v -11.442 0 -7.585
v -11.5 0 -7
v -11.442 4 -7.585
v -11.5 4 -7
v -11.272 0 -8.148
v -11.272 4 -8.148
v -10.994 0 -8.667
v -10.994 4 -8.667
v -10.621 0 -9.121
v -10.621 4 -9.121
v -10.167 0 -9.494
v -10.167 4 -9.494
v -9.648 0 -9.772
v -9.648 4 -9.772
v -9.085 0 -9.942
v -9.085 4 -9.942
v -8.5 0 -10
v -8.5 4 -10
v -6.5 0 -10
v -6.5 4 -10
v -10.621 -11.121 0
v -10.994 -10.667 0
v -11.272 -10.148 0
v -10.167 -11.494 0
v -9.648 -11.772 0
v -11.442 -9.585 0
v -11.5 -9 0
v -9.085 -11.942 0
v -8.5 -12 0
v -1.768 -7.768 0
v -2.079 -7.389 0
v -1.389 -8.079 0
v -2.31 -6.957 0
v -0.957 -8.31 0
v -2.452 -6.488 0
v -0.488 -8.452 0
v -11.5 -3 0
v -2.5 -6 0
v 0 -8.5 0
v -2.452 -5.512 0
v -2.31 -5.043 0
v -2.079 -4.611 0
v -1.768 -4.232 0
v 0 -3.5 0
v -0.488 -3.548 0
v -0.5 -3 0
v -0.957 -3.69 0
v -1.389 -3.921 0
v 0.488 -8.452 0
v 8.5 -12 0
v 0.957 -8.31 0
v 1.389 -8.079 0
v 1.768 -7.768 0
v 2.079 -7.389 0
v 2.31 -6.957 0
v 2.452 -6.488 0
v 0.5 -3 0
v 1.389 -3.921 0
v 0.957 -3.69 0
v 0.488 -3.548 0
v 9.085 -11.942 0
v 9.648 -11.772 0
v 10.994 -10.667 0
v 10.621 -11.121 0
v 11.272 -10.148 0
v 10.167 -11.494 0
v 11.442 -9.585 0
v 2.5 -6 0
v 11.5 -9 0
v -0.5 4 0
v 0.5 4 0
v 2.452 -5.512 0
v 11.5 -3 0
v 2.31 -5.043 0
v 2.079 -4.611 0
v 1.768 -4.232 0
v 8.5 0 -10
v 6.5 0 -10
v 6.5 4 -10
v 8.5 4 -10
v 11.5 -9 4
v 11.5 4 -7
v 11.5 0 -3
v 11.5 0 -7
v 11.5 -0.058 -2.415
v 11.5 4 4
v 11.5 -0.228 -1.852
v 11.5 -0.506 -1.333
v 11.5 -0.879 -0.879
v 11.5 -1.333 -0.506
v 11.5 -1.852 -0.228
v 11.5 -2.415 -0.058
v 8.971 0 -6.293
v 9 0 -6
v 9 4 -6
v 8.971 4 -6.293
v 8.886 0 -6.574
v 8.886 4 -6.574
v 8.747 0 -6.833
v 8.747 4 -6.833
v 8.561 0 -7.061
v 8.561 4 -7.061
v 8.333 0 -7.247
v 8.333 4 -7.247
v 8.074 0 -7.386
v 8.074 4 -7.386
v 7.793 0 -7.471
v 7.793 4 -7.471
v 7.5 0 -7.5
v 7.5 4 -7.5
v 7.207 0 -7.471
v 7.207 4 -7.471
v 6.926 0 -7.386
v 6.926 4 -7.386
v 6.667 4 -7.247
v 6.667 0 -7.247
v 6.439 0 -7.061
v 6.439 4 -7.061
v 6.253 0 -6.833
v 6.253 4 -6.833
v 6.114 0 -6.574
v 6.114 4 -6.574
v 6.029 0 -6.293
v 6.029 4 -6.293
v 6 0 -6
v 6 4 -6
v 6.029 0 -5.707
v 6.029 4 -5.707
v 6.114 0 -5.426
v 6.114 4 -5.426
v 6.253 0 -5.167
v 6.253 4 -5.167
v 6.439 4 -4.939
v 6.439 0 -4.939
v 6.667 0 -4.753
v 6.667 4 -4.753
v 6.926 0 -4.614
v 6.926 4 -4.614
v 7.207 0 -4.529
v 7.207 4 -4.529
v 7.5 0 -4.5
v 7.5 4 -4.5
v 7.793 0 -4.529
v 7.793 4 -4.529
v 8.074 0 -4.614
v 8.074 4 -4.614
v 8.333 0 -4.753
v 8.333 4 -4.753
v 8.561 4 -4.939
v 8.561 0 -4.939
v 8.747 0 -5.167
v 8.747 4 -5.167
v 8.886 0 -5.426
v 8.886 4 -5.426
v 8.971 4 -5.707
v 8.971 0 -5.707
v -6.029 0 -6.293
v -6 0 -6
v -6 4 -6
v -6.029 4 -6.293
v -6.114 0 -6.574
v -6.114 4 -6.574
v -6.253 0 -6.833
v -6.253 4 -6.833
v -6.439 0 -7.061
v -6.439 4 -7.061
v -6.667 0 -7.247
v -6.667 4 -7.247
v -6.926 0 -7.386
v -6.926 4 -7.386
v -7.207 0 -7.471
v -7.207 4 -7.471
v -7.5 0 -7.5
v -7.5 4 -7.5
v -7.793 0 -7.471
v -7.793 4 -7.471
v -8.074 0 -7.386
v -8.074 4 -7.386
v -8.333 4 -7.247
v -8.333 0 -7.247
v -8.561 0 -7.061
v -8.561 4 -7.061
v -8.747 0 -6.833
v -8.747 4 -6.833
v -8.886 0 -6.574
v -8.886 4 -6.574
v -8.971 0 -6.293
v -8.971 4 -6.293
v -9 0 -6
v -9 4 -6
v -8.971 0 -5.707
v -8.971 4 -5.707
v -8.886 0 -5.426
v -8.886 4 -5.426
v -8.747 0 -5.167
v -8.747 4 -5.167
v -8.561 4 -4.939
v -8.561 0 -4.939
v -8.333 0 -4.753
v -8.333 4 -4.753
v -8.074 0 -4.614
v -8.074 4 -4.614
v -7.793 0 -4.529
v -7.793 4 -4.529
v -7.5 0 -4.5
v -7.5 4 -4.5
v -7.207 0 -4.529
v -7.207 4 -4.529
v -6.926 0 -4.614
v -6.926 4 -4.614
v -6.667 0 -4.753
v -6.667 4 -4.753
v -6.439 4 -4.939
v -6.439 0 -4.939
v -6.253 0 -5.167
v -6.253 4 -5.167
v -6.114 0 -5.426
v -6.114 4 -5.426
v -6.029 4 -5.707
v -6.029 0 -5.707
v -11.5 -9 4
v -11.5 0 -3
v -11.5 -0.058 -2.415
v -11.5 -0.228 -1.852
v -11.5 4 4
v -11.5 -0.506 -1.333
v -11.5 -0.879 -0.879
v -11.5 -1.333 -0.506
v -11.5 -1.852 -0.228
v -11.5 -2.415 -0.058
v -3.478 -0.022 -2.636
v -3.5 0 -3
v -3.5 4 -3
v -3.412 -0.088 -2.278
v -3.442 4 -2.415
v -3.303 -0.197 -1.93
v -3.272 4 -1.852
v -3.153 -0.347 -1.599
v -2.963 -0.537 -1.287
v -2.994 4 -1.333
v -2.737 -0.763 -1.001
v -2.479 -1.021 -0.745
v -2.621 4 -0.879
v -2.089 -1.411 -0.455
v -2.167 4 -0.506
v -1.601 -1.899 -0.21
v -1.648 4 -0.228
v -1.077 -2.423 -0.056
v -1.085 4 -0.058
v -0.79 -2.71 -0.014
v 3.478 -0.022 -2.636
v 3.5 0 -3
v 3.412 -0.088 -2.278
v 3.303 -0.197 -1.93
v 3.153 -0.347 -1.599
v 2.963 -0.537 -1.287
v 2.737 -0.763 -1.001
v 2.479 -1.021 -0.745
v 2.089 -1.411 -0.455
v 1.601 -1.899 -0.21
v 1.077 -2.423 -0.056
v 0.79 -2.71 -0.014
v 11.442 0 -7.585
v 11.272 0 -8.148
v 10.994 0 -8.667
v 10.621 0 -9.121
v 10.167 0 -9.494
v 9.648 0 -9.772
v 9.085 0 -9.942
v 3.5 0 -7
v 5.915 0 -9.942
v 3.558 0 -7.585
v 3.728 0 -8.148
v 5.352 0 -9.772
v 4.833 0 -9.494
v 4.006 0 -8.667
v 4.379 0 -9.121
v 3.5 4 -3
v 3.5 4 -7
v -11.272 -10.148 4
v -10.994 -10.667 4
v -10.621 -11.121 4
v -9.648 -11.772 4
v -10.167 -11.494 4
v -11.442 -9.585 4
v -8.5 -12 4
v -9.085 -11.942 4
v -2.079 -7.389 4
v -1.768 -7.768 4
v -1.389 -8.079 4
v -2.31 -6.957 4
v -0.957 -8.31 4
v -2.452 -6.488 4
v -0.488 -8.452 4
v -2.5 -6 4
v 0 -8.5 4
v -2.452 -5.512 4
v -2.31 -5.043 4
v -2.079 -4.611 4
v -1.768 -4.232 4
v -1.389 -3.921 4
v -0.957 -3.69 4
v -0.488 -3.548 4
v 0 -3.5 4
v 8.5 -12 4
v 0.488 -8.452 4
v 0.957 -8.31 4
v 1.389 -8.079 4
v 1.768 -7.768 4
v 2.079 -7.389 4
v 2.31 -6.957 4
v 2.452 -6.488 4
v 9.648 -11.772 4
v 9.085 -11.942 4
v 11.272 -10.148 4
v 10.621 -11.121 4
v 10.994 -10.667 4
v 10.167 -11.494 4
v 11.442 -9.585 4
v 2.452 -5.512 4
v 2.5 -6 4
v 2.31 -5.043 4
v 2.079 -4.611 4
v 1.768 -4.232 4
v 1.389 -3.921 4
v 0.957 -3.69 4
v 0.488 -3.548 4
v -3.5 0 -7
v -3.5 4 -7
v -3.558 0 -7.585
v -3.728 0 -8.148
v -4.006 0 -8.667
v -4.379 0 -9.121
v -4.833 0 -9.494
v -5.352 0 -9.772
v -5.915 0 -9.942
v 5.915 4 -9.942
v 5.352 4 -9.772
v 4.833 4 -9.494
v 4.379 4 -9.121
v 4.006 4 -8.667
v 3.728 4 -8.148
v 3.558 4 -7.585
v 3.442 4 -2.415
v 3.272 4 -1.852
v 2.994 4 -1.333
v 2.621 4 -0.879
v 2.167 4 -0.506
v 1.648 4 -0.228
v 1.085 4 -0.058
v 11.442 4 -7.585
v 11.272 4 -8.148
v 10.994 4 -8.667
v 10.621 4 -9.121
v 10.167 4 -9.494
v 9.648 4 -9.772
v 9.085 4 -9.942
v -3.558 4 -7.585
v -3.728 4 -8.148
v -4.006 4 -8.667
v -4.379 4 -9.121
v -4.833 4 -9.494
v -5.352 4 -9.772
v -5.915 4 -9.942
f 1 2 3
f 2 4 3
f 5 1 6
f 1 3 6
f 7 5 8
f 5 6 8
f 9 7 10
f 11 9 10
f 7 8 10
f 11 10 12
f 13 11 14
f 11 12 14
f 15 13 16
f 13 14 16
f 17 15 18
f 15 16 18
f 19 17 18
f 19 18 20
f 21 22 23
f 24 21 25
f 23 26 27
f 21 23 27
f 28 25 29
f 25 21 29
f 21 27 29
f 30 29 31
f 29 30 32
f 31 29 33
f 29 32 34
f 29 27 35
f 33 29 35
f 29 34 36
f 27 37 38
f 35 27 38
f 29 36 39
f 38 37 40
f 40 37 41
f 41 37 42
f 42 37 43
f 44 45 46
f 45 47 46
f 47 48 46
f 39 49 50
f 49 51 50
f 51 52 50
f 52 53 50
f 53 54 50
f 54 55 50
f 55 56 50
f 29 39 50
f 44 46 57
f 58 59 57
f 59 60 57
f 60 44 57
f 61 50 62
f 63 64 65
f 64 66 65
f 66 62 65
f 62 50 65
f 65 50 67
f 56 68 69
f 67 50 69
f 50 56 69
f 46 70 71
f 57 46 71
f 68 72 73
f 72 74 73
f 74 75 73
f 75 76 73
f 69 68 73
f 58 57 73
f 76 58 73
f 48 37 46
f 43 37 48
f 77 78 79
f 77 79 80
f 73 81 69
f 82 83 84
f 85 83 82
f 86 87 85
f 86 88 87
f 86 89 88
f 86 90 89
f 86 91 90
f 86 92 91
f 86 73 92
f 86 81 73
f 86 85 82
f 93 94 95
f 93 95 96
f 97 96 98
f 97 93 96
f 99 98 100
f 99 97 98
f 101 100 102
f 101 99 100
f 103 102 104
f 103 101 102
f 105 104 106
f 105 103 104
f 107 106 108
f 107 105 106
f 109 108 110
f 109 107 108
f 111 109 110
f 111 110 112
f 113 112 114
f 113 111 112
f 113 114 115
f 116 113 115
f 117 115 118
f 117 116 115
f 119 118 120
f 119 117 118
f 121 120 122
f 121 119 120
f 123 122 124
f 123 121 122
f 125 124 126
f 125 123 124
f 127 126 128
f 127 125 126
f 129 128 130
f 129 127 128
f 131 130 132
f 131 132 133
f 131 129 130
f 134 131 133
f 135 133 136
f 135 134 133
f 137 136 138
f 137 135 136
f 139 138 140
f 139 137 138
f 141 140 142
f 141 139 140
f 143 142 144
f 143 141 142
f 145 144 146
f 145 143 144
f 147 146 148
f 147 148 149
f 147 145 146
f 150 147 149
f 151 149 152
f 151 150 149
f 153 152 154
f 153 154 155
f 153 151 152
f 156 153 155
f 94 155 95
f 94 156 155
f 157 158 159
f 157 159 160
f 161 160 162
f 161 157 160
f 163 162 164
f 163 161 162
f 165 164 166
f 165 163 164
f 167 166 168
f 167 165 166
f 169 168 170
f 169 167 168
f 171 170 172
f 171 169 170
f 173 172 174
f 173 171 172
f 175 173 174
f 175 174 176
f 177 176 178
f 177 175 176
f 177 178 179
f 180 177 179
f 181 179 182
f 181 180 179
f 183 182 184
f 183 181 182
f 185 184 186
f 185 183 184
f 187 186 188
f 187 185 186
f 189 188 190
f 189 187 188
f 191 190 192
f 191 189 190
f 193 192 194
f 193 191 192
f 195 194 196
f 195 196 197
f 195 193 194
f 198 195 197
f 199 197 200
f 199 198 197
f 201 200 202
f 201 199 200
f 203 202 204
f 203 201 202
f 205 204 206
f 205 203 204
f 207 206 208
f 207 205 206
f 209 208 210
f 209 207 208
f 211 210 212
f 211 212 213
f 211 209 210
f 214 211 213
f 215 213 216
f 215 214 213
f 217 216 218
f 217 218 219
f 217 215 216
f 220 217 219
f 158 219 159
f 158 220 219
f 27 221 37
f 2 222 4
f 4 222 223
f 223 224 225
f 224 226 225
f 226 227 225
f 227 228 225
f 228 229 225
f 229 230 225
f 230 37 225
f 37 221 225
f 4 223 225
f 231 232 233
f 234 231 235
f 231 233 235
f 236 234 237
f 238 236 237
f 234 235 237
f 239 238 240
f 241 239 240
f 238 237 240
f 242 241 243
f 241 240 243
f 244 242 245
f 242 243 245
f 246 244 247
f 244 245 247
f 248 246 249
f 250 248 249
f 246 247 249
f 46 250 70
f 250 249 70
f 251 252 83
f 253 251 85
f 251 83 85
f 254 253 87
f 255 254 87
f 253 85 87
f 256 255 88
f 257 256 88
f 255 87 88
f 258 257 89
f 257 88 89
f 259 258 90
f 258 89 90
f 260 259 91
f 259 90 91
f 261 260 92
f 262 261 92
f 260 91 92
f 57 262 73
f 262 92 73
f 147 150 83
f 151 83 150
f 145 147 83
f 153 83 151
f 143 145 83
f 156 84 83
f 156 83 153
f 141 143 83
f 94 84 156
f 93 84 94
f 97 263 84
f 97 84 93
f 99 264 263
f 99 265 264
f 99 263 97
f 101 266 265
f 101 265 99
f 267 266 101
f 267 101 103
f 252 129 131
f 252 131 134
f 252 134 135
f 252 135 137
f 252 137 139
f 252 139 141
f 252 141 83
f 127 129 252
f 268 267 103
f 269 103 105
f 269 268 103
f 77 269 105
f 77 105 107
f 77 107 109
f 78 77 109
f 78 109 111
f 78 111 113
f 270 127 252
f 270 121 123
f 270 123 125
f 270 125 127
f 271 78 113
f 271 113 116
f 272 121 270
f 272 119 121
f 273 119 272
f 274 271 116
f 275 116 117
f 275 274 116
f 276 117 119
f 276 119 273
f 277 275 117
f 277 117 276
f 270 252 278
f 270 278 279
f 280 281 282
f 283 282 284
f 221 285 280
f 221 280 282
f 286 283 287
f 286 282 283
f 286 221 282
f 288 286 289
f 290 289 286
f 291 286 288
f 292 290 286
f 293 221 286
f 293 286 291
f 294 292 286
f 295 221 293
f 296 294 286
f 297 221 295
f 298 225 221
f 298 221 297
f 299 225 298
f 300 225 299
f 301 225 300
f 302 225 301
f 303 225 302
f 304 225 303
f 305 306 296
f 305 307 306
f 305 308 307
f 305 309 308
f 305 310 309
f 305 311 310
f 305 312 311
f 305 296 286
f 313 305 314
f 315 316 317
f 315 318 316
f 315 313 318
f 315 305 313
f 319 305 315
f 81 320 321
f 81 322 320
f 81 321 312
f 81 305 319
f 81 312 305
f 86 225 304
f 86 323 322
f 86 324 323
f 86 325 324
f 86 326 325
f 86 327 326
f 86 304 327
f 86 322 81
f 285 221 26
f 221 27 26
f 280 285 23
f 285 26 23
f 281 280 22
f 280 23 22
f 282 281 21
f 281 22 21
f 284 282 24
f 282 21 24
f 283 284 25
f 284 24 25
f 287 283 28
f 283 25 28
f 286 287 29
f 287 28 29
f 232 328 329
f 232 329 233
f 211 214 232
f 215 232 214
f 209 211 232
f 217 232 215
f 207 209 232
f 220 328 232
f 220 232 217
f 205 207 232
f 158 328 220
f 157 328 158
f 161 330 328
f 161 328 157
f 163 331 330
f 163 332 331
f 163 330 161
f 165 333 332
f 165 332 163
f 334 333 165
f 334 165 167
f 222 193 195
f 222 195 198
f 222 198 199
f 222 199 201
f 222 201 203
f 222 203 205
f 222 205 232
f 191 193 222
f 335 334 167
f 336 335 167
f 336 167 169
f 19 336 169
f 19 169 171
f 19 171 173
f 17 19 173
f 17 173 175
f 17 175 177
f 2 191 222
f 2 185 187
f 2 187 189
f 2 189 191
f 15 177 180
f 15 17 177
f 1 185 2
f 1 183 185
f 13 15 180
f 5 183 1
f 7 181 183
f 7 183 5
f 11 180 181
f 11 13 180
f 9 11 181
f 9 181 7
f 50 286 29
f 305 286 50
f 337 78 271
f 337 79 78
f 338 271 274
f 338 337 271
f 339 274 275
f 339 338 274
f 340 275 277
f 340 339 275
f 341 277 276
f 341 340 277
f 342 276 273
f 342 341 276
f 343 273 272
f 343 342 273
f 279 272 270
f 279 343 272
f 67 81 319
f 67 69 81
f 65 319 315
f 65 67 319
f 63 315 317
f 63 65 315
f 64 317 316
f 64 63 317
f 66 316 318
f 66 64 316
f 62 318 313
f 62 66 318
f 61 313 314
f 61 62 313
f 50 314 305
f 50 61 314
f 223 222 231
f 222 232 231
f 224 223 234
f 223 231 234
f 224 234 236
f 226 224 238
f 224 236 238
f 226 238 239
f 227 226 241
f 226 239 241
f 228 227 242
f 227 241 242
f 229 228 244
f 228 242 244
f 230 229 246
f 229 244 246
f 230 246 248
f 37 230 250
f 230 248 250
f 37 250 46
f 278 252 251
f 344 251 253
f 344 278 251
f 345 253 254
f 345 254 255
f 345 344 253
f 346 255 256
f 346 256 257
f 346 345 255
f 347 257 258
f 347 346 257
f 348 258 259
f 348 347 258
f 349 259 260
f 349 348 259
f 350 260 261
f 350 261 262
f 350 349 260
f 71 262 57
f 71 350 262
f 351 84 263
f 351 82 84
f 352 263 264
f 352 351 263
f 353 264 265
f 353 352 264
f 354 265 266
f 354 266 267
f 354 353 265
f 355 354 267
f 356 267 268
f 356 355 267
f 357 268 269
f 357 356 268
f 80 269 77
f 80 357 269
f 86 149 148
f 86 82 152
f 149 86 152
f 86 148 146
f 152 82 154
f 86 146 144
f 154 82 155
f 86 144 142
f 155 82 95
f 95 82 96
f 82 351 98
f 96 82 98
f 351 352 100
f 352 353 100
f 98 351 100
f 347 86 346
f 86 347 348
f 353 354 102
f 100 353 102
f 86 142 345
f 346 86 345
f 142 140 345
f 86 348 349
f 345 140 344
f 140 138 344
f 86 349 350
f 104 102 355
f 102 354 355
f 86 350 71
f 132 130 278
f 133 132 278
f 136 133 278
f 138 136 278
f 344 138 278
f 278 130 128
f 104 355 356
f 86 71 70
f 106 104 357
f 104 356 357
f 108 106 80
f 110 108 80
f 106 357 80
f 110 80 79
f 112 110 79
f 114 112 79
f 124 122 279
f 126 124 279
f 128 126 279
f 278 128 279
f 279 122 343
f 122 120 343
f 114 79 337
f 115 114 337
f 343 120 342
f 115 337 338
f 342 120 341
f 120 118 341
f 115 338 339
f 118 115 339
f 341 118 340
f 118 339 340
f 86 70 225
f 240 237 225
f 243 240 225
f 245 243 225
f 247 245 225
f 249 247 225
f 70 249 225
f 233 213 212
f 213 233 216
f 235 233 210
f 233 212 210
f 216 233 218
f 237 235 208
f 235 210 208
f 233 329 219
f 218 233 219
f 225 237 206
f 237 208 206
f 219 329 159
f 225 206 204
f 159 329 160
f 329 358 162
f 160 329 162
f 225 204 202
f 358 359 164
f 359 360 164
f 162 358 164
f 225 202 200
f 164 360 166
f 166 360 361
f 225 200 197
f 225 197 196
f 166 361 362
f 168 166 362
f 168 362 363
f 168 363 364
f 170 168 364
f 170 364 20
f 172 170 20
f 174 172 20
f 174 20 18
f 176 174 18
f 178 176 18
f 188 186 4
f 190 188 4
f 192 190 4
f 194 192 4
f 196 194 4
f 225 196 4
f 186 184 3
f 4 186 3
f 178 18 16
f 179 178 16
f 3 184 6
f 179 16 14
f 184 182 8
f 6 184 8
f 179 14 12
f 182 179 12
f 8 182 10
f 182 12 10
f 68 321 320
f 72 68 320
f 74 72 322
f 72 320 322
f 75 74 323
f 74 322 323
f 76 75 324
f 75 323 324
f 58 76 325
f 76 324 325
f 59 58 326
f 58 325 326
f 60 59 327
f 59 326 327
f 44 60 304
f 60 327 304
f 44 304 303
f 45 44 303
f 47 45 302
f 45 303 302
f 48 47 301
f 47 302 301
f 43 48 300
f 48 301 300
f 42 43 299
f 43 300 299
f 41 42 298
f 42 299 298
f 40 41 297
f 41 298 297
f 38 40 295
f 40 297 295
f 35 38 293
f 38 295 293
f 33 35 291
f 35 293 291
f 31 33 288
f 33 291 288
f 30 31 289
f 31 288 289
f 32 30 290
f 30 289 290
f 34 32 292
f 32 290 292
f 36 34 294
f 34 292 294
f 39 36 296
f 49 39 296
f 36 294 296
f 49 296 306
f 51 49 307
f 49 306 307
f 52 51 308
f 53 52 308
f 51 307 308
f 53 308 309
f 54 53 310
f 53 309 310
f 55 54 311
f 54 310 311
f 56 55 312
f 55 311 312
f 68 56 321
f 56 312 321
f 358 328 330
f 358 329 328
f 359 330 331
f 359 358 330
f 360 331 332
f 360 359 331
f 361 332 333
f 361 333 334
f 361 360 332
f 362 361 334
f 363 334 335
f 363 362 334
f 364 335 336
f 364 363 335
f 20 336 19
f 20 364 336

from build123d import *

# Parameters (mm, degrees)
ESBO_O1_R                = 1.5
RESSALTO_EXTRUS_O1_DEPTH = 4
ESBO_O2_W                = 23
ESBO_O2_H                = 12
ESBO_O2_R                = 2.5
RESSALTO_EXTRUS_O2_DEPTH = 4
FILETE1_R                = 3


with BuildPart() as part:
    # Esboço1 → Ressalto-extrusão1 (new body)
    with BuildSketch(Plane(origin=(0, 0, 0), x_dir=(1, 0, 0), z_dir=(0, 1, 0))):
        Polygon((-3.5, 0), (3.5, 0), (3.5, 10), (11.5, 10), (11.5, -4), (-11.5, -4), (-11.5, 10), (-3.5, 10), align=None)
        with Locations((-7.5, 6)):
            Circle(ESBO_O1_R, mode=Mode.SUBTRACT)
        with Locations((7.5, 6)):
            Circle(ESBO_O1_R, mode=Mode.SUBTRACT)
    extrude(amount=RESSALTO_EXTRUS_O1_DEPTH)

    # Esboço2 → Ressalto-extrusão2 (add)
    with BuildSketch(Plane.XY.offset(4)):
        with Locations((0, -6)):
            Rectangle(ESBO_O2_W, ESBO_O2_H)
        with Locations((0, -6)):
            Circle(ESBO_O2_R, mode=Mode.SUBTRACT)
    extrude(amount=-RESSALTO_EXTRUS_O2_DEPTH)

    # Filete1
    filete1_edges = [part.edges().sort_by_distance(p)[0] for p in [
        (-3.5, 2, 0),
        (3.5, 2, 0),
        (3.5, 2, -10),
        (11.5, 2, -10),
        (-11.5, 2, -10),
        (-3.5, 2, -10),
        (-7.5, 0, 0),
        (11.5, -12, 2),
        (-11.5, -12, 2),
        (7.5, 0, 0),
    ]]
    fillet(filete1_edges, radius=FILETE1_R)


solid = part.part
